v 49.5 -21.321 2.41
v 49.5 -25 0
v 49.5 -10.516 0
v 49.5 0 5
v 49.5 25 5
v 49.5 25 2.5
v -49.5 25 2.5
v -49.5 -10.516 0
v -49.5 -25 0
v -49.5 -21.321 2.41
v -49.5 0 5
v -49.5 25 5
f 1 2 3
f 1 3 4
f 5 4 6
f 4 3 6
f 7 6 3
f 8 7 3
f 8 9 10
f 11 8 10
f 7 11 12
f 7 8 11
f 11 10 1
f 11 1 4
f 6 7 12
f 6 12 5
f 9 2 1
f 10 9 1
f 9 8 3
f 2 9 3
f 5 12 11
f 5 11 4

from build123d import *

# Parameters (mm, degrees)
F0_W     = 99
F0_H     = 50
F1_DEPTH = 5
F3_DEPTH = 127
F5_DEPTH = 152.4


with BuildPart() as f1:
    # F0 (on Top) → F1 (new body)
    with BuildSketch(Plane.XY):
        Rectangle(F0_W, F0_H)
    extrude(amount=F1_DEPTH)

    # F2 (on face) → F3 (cut)
    with BuildSketch(Plane.YZ.offset(49.5)):
        Polygon((-21.321116, 2.410467), (0, 5), (-25, 5), (-25, 0), align=None)
    extrude(amount=-F3_DEPTH, mode=Mode.SUBTRACT)

    # F4 (on face) → F5 (cut)
    with BuildSketch(Plane.YZ.offset(49.5)):
        Polygon((25, 2.5), (-10.516109, 0), (25, 0), align=None)
    extrude(amount=-F5_DEPTH, mode=Mode.SUBTRACT)


solid = f1.part
